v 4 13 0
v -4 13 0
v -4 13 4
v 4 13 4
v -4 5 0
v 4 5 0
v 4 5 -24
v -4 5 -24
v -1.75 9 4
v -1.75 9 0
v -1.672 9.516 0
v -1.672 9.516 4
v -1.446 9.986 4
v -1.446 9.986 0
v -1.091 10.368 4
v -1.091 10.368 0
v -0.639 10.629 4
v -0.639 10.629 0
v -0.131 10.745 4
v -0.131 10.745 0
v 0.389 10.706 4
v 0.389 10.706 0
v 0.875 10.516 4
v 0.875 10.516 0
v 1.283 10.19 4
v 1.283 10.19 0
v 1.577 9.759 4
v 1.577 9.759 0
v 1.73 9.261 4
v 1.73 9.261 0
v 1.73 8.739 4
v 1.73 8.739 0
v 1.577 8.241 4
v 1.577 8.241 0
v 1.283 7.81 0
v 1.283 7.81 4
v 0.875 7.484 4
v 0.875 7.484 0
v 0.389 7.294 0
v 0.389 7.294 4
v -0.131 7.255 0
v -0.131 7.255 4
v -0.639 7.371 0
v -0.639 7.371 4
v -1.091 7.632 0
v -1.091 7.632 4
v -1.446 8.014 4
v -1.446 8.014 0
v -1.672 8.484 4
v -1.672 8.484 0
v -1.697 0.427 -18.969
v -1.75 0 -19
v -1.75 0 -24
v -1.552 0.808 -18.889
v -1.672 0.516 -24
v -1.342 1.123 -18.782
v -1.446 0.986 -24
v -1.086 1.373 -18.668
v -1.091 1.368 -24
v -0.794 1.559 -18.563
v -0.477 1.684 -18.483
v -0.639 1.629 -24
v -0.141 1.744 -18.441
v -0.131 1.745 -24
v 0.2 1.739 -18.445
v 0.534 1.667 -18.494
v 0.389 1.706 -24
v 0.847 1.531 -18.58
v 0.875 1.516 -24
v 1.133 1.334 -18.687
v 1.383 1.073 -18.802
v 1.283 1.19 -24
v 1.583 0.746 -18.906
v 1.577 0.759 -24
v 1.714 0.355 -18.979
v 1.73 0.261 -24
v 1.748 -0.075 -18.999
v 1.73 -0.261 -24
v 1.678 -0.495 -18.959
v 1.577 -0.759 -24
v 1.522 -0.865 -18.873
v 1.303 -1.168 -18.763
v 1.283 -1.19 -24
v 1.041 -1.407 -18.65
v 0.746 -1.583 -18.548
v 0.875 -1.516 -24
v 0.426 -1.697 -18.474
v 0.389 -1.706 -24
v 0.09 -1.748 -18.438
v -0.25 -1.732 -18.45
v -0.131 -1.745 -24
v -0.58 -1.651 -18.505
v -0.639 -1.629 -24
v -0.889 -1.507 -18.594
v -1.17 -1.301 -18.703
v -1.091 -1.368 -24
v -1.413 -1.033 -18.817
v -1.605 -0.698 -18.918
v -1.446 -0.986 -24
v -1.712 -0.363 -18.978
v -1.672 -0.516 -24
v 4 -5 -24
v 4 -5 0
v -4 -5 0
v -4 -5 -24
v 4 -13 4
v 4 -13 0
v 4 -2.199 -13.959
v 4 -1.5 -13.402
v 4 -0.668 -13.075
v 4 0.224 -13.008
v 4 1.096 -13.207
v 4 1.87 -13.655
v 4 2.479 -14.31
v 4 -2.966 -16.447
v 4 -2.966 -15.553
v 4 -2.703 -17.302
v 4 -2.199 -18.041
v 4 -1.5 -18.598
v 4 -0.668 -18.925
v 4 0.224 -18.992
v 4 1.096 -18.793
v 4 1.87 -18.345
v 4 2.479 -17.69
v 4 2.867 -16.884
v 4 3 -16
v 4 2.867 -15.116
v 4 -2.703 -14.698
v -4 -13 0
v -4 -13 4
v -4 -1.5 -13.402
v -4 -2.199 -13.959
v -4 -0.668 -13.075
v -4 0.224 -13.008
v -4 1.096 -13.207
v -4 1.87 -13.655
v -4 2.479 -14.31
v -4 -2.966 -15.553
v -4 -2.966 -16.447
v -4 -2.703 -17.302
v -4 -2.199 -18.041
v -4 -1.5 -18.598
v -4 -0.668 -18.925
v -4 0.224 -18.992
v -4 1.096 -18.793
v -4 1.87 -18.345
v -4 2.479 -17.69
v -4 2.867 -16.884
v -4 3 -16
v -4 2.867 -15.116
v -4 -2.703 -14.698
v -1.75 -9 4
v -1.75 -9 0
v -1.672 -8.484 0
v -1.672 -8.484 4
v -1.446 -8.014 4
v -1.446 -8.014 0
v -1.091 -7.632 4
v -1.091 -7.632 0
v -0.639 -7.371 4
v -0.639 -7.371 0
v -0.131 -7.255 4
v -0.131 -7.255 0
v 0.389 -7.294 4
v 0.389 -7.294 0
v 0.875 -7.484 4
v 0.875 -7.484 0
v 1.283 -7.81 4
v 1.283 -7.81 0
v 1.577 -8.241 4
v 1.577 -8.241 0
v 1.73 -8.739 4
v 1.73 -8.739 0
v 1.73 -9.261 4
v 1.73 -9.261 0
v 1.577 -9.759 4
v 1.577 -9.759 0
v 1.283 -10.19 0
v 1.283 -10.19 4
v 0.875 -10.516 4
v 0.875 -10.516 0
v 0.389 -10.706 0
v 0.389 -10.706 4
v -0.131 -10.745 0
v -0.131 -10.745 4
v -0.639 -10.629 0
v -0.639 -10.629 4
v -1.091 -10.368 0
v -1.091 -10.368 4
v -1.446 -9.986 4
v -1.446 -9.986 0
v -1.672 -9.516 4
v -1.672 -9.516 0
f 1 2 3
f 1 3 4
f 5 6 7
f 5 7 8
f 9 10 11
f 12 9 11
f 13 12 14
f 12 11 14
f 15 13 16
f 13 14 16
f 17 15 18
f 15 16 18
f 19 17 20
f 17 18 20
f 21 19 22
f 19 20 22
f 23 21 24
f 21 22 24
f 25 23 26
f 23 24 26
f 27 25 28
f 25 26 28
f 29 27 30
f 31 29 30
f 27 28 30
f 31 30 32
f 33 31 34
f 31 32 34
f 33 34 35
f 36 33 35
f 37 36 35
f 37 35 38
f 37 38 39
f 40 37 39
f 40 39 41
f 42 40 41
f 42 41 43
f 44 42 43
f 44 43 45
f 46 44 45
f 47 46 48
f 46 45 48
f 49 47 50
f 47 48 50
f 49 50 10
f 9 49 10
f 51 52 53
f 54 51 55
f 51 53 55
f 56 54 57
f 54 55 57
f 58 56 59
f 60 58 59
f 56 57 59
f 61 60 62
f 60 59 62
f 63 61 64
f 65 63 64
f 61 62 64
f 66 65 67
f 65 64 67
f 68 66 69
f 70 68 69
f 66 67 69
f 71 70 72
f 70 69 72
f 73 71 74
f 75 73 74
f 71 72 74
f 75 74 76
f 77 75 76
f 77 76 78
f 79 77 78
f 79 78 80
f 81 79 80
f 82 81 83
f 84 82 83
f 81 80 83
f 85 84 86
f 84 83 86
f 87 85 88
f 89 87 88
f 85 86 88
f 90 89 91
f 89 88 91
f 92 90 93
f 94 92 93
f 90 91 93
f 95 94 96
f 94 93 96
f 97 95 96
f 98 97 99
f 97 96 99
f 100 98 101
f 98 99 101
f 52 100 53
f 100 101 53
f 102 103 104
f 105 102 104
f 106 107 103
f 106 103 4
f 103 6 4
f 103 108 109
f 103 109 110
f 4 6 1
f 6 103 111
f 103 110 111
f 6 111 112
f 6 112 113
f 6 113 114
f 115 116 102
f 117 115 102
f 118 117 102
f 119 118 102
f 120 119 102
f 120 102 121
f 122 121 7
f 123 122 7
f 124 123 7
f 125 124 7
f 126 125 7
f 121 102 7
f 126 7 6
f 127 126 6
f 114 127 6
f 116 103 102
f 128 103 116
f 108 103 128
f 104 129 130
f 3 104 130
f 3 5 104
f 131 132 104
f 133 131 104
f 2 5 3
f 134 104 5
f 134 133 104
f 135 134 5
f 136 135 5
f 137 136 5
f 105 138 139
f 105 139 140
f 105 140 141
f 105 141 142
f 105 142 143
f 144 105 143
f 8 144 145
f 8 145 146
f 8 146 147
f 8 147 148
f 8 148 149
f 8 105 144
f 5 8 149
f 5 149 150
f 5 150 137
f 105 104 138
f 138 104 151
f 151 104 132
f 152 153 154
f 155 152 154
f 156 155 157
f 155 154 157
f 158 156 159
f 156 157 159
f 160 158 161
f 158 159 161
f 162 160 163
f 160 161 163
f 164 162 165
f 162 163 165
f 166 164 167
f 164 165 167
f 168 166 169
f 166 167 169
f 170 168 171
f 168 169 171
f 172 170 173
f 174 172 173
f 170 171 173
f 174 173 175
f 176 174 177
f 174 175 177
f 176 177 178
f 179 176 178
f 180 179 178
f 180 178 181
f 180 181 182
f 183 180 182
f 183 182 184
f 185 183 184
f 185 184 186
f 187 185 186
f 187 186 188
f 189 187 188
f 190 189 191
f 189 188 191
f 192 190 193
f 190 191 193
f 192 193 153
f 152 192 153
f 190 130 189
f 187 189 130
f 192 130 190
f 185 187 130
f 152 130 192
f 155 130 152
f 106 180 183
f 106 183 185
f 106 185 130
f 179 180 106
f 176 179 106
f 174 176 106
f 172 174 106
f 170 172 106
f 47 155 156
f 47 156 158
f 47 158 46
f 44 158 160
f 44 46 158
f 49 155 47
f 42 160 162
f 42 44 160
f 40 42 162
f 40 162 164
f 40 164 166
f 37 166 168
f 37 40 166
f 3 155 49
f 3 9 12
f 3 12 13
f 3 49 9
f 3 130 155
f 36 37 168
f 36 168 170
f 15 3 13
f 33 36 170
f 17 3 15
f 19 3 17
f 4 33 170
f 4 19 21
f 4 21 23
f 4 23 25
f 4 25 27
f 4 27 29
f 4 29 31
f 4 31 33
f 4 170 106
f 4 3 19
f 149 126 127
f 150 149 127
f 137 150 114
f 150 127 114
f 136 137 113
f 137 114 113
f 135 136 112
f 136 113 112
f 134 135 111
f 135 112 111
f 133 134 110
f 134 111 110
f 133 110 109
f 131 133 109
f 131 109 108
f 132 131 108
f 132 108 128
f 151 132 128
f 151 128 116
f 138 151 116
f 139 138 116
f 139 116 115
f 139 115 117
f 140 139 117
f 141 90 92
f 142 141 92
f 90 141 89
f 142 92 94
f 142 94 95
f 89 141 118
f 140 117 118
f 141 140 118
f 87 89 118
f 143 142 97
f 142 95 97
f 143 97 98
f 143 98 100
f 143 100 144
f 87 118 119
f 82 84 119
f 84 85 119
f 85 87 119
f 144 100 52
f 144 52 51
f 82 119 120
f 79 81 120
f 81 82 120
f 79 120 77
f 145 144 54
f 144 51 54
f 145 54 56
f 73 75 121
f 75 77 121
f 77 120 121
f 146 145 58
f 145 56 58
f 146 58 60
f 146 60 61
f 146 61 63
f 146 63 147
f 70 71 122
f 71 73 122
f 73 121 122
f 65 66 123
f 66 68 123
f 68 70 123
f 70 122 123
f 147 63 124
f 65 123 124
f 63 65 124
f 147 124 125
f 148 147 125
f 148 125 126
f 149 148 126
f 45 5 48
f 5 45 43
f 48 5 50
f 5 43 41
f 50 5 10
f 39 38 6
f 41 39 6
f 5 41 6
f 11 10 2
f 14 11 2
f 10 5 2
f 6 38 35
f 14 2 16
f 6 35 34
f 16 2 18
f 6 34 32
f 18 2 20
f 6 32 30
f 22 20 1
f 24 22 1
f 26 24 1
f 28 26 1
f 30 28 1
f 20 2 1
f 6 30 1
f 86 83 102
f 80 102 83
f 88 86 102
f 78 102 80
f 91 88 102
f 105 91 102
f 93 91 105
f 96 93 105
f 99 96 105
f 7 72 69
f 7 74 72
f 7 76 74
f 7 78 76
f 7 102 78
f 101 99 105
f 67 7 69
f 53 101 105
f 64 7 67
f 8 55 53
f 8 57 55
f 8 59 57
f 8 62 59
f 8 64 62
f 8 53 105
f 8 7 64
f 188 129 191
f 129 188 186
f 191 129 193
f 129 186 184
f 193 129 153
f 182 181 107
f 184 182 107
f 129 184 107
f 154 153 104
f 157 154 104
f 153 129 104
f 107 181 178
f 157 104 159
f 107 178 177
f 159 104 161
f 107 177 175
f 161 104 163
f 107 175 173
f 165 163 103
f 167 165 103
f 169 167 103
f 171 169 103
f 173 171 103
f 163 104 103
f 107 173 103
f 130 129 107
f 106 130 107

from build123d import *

# Parameters (mm, degrees)
SKETCH1_W               = 8
SKETCH1_H               = 26
BOSS_EXTRUDE1_DEPTH     = 4
SKETCH2_R               = 1.75
CUT_EXTRUDE1_DEPTH      = 4
SKETCH3_W               = 8
SKETCH3_H               = 10
BOSS_EXTRUDE2_DEPTH     = 24
SKETCH4_R               = 3
CUT_EXTRUDE2_DEPTH      = 20
CUT_EXTRUDE3_REACH      = 33.129
CUT_EXTRUDE3_END_RADIUS = 3
SKETCH5_R               = 1.75


with BuildPart() as part:
    # Sketch1 → Boss-Extrude1 (new body)
    with BuildSketch(Plane.XY):
        Rectangle(SKETCH1_W, SKETCH1_H)
    extrude(amount=BOSS_EXTRUDE1_DEPTH)

    # Sketch2 → Cut-Extrude1 (cut)
    with BuildSketch(Plane(origin=(0, 0, 0), x_dir=(-1, 0, 0), z_dir=(0, 0, -1))):
        with Locations((0, 9)):
            Circle(SKETCH2_R)
        with Locations((0, -9)):
            Circle(SKETCH2_R)
    extrude(amount=-CUT_EXTRUDE1_DEPTH, mode=Mode.SUBTRACT)

    # Sketch3 → Boss-Extrude2 (add)
    with BuildSketch(Plane(origin=(0, 0, 0), x_dir=(-1, 0, 0), z_dir=(0, 0, -1))):
        Rectangle(SKETCH3_W, SKETCH3_H)
    extrude(amount=BOSS_EXTRUDE2_DEPTH)

    # Sketch4 → Cut-Extrude2 (cut)
    with BuildSketch(Plane(origin=(4, 0, 0), x_dir=(0, 0, -1), z_dir=(1, 0, 0))):
        with Locations(Location((16, 0, 0), (0, 0, 90))):
            Circle(SKETCH4_R)
    extrude(amount=-CUT_EXTRUDE2_DEPTH, mode=Mode.SUBTRACT)

    # Cut-Extrude3: up to this cylinder (the profile starts outside it)
    cut_extrude3_end = Plane(origin=(0, 0, -16), z_dir=(1, 0, 0)) * Cylinder(CUT_EXTRUDE3_END_RADIUS, 73.258, mode=Mode.PRIVATE)
    # Sketch5 → Cut-Extrude3 (cut, up to the surface)
    with BuildSketch(Plane(origin=(0, 0, -24), x_dir=(-1, 0, 0), z_dir=(0, 0, -1)), mode=Mode.PRIVATE) as cut_extrude3_sk1:
        Circle(SKETCH5_R)
    cut_extrude3_tool1 = extrude(cut_extrude3_sk1.sketch, amount=-CUT_EXTRUDE3_REACH, mode=Mode.PRIVATE) - cut_extrude3_end
    add(cut_extrude3_tool1.solids().sort_by_distance((0, 0, -24))[0], mode=Mode.SUBTRACT)


solid = part.part
